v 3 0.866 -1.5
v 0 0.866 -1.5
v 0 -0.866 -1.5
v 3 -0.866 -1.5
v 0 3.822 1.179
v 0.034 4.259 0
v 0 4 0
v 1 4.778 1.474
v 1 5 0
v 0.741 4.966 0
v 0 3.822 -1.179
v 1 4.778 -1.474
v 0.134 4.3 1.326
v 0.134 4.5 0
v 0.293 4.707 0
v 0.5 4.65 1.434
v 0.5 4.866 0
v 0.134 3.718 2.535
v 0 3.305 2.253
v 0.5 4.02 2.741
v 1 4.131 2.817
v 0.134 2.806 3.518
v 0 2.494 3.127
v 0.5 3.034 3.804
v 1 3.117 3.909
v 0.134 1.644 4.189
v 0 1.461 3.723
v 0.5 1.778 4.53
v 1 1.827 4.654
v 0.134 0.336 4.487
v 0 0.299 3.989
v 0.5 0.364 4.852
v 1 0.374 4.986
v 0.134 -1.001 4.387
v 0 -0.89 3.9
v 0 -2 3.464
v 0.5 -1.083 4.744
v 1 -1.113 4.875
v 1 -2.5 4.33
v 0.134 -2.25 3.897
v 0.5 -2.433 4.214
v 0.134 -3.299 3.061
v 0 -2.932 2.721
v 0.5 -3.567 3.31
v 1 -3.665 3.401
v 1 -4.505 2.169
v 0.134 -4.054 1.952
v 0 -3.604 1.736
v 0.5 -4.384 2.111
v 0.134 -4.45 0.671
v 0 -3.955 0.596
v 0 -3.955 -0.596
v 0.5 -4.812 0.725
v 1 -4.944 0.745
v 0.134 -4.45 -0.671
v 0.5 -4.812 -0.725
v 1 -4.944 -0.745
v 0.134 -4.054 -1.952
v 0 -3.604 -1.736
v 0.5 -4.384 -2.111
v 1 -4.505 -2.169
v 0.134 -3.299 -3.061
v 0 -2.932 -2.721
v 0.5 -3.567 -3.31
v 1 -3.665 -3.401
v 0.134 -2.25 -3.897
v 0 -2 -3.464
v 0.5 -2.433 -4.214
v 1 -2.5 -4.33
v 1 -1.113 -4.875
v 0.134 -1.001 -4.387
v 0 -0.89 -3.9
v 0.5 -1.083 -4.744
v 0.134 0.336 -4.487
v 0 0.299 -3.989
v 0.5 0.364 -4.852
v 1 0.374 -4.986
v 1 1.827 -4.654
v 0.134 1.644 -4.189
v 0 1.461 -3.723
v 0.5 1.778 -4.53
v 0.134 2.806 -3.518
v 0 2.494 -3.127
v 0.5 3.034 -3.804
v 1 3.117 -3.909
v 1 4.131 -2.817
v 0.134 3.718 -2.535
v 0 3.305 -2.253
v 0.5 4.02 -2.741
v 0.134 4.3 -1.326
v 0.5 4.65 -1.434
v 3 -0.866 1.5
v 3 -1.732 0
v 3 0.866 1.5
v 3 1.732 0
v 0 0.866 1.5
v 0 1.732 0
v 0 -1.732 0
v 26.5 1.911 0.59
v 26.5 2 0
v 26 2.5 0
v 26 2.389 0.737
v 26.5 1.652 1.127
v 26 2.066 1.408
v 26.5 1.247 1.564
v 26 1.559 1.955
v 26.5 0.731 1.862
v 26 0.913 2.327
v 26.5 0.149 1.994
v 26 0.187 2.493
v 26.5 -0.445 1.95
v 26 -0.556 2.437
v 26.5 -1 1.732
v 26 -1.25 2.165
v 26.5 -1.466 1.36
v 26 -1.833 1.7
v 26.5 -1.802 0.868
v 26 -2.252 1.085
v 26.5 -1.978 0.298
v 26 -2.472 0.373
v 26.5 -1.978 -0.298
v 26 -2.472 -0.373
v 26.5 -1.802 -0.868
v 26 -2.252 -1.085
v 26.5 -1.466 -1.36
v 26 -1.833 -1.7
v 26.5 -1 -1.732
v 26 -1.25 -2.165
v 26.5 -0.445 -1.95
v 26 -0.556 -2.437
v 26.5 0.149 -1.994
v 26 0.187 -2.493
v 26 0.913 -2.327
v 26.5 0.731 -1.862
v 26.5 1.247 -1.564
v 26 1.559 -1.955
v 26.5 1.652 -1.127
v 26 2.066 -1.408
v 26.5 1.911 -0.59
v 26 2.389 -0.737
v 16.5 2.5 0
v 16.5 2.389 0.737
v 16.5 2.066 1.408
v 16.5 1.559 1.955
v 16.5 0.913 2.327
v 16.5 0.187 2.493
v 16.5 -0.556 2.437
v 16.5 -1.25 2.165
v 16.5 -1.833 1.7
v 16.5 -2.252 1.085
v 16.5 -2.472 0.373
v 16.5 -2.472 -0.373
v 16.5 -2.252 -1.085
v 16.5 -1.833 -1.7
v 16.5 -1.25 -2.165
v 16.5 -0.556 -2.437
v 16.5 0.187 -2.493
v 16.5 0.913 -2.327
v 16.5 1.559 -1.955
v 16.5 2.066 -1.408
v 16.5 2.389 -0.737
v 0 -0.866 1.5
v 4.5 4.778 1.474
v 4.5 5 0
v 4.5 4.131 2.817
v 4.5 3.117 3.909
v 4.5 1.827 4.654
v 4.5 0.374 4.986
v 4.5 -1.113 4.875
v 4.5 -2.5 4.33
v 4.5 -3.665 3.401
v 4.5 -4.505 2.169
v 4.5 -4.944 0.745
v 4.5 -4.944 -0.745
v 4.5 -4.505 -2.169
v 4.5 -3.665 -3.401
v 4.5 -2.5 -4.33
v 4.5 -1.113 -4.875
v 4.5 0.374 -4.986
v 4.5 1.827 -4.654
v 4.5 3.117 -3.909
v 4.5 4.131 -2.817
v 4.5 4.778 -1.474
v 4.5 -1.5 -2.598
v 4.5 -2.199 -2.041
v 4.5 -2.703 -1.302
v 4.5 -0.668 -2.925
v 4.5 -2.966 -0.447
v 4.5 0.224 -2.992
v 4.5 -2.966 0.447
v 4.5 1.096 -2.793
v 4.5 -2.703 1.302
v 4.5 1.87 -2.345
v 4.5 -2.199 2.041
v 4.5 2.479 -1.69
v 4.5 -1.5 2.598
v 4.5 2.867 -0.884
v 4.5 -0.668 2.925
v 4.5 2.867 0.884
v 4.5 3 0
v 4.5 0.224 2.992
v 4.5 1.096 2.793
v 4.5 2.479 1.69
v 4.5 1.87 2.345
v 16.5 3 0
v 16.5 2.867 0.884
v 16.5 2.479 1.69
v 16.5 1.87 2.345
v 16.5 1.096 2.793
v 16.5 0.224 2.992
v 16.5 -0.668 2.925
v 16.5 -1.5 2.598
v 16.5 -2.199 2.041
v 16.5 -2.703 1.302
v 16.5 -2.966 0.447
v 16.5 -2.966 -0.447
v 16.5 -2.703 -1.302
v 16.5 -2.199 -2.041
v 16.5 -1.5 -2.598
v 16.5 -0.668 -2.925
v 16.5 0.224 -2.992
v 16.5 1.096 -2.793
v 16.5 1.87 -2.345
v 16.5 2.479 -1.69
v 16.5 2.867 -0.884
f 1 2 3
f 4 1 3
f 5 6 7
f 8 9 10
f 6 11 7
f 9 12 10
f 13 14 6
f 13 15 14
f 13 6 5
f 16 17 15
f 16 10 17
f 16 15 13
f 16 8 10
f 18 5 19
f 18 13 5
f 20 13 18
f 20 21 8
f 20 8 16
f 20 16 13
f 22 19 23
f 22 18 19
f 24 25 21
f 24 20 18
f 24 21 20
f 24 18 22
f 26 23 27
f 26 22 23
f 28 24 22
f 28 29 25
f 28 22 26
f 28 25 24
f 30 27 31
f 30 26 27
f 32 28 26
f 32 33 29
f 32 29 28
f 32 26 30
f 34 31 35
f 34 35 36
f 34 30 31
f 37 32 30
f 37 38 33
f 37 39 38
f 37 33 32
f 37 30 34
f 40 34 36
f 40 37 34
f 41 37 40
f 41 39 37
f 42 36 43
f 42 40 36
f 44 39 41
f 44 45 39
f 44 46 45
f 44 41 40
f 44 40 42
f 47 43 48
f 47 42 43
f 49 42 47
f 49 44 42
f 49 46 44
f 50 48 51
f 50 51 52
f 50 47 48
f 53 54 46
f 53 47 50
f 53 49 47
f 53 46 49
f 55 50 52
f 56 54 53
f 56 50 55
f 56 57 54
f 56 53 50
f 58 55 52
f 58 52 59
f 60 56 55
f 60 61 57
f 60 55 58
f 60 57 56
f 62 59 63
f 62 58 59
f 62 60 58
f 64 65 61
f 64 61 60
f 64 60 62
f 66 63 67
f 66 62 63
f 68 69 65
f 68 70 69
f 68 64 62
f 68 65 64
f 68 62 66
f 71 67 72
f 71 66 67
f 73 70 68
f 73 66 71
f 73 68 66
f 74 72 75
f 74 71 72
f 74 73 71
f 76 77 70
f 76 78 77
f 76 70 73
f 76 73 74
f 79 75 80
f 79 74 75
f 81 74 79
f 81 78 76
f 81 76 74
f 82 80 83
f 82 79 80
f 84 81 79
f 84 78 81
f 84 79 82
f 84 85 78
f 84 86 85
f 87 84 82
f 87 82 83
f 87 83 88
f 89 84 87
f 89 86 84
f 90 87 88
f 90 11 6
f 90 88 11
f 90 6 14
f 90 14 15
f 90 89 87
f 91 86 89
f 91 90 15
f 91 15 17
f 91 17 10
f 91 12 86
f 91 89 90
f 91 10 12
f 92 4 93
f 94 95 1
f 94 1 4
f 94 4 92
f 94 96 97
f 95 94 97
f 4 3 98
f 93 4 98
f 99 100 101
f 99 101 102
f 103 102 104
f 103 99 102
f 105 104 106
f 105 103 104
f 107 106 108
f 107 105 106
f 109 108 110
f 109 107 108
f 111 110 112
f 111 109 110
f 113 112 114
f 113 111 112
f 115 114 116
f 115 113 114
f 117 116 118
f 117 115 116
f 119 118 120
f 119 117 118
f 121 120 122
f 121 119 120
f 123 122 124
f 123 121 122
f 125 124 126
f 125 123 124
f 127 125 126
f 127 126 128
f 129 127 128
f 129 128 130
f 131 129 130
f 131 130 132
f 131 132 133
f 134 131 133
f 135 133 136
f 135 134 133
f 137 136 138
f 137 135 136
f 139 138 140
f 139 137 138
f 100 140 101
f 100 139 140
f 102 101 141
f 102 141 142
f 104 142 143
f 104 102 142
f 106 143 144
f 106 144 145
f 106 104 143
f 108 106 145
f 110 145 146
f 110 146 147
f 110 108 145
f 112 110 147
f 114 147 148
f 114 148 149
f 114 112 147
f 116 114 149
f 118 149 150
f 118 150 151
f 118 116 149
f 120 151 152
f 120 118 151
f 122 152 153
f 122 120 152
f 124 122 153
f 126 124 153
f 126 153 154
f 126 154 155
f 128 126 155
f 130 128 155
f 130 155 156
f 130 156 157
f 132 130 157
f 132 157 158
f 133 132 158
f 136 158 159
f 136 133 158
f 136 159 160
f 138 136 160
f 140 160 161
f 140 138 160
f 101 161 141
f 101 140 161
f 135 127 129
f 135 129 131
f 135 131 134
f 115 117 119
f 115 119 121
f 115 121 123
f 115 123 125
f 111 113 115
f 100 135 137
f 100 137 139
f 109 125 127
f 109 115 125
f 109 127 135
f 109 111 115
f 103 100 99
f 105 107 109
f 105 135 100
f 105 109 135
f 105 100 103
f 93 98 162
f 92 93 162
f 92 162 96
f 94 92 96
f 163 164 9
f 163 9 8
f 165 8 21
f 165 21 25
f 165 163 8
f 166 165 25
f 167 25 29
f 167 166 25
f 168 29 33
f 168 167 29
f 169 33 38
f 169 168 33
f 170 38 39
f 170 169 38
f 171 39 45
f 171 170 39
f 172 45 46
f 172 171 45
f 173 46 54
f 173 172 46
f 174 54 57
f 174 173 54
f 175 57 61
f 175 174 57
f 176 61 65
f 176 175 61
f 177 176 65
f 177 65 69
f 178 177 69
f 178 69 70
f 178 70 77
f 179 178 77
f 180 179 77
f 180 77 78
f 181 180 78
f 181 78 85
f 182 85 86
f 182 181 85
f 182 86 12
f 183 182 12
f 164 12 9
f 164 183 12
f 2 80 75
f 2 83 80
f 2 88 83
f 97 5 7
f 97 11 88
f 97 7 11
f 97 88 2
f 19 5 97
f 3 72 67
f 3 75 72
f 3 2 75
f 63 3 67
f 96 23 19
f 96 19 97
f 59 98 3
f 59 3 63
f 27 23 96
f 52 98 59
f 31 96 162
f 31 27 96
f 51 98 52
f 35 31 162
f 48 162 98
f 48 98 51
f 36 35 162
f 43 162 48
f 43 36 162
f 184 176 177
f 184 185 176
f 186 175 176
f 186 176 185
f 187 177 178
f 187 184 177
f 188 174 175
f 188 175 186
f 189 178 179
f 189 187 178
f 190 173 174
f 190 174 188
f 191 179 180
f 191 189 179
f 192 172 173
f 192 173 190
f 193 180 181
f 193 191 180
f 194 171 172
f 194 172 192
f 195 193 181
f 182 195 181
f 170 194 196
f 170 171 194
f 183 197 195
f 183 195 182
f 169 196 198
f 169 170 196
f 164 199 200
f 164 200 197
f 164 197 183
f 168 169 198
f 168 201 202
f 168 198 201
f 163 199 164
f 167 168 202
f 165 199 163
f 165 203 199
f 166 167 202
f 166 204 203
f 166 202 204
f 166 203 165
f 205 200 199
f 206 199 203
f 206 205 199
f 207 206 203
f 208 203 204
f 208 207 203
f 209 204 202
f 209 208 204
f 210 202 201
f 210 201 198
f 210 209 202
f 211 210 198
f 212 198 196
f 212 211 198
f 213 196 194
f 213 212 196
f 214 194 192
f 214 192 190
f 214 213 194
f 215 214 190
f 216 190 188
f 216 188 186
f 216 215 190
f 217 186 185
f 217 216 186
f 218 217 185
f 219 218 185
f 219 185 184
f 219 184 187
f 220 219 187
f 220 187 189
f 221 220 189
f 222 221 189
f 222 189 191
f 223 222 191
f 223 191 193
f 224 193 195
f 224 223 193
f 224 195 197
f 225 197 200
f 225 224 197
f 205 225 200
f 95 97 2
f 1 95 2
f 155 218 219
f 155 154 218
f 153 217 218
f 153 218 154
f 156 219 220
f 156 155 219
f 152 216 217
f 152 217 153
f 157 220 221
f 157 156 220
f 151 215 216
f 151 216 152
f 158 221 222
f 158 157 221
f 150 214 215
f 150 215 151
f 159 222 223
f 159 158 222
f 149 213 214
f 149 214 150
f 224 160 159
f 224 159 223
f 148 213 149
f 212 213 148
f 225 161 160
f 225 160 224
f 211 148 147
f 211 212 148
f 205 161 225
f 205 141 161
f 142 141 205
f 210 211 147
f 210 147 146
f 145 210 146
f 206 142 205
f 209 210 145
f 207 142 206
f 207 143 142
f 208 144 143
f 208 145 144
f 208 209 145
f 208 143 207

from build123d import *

# Parameters (mm, degrees)
CUT_EXTRUDE_1_DEPTH = 3
FILLET_1_R          = 1
CHAMFER_1_SIZE      = 0.5


with BuildPart() as part:
    # 草图1 → 旋转1 (revolve)
    with BuildSketch(Plane.XY):
        Polygon((0, 0), (0, 5), (4.5, 5), (4.5, 3), (16.5, 3), (16.5, 2.5), (26.5, 2.5), (26.5, 0), align=None)
    revolve(axis=Axis((0, 0, 0), (1, 0, 0)))

    # 草图2 → 切除-拉伸1 (cut)
    with BuildSketch(Plane.ZY):
        Polygon((0, 1.732050808), (-1.5, 0.866025404), (-1.5, -0.866025404), (0, -1.732050808), (1.5, -0.866025404), (1.5, 0.866025404), align=None)
    extrude(amount=-CUT_EXTRUDE_1_DEPTH, mode=Mode.SUBTRACT)

    # 圆角1
    fillet_1_edges = [part.edges().sort_by_distance(p)[0] for p in [
        (0, -5, 0),
    ]]
    fillet(fillet_1_edges, radius=FILLET_1_R)

    # 倒角1
    chamfer_1_edges = [part.edges().sort_by_distance(p)[0] for p in [
        (26.5, -2.5, 0),
    ]]
    chamfer(chamfer_1_edges, length=CHAMFER_1_SIZE)


solid = part.part
